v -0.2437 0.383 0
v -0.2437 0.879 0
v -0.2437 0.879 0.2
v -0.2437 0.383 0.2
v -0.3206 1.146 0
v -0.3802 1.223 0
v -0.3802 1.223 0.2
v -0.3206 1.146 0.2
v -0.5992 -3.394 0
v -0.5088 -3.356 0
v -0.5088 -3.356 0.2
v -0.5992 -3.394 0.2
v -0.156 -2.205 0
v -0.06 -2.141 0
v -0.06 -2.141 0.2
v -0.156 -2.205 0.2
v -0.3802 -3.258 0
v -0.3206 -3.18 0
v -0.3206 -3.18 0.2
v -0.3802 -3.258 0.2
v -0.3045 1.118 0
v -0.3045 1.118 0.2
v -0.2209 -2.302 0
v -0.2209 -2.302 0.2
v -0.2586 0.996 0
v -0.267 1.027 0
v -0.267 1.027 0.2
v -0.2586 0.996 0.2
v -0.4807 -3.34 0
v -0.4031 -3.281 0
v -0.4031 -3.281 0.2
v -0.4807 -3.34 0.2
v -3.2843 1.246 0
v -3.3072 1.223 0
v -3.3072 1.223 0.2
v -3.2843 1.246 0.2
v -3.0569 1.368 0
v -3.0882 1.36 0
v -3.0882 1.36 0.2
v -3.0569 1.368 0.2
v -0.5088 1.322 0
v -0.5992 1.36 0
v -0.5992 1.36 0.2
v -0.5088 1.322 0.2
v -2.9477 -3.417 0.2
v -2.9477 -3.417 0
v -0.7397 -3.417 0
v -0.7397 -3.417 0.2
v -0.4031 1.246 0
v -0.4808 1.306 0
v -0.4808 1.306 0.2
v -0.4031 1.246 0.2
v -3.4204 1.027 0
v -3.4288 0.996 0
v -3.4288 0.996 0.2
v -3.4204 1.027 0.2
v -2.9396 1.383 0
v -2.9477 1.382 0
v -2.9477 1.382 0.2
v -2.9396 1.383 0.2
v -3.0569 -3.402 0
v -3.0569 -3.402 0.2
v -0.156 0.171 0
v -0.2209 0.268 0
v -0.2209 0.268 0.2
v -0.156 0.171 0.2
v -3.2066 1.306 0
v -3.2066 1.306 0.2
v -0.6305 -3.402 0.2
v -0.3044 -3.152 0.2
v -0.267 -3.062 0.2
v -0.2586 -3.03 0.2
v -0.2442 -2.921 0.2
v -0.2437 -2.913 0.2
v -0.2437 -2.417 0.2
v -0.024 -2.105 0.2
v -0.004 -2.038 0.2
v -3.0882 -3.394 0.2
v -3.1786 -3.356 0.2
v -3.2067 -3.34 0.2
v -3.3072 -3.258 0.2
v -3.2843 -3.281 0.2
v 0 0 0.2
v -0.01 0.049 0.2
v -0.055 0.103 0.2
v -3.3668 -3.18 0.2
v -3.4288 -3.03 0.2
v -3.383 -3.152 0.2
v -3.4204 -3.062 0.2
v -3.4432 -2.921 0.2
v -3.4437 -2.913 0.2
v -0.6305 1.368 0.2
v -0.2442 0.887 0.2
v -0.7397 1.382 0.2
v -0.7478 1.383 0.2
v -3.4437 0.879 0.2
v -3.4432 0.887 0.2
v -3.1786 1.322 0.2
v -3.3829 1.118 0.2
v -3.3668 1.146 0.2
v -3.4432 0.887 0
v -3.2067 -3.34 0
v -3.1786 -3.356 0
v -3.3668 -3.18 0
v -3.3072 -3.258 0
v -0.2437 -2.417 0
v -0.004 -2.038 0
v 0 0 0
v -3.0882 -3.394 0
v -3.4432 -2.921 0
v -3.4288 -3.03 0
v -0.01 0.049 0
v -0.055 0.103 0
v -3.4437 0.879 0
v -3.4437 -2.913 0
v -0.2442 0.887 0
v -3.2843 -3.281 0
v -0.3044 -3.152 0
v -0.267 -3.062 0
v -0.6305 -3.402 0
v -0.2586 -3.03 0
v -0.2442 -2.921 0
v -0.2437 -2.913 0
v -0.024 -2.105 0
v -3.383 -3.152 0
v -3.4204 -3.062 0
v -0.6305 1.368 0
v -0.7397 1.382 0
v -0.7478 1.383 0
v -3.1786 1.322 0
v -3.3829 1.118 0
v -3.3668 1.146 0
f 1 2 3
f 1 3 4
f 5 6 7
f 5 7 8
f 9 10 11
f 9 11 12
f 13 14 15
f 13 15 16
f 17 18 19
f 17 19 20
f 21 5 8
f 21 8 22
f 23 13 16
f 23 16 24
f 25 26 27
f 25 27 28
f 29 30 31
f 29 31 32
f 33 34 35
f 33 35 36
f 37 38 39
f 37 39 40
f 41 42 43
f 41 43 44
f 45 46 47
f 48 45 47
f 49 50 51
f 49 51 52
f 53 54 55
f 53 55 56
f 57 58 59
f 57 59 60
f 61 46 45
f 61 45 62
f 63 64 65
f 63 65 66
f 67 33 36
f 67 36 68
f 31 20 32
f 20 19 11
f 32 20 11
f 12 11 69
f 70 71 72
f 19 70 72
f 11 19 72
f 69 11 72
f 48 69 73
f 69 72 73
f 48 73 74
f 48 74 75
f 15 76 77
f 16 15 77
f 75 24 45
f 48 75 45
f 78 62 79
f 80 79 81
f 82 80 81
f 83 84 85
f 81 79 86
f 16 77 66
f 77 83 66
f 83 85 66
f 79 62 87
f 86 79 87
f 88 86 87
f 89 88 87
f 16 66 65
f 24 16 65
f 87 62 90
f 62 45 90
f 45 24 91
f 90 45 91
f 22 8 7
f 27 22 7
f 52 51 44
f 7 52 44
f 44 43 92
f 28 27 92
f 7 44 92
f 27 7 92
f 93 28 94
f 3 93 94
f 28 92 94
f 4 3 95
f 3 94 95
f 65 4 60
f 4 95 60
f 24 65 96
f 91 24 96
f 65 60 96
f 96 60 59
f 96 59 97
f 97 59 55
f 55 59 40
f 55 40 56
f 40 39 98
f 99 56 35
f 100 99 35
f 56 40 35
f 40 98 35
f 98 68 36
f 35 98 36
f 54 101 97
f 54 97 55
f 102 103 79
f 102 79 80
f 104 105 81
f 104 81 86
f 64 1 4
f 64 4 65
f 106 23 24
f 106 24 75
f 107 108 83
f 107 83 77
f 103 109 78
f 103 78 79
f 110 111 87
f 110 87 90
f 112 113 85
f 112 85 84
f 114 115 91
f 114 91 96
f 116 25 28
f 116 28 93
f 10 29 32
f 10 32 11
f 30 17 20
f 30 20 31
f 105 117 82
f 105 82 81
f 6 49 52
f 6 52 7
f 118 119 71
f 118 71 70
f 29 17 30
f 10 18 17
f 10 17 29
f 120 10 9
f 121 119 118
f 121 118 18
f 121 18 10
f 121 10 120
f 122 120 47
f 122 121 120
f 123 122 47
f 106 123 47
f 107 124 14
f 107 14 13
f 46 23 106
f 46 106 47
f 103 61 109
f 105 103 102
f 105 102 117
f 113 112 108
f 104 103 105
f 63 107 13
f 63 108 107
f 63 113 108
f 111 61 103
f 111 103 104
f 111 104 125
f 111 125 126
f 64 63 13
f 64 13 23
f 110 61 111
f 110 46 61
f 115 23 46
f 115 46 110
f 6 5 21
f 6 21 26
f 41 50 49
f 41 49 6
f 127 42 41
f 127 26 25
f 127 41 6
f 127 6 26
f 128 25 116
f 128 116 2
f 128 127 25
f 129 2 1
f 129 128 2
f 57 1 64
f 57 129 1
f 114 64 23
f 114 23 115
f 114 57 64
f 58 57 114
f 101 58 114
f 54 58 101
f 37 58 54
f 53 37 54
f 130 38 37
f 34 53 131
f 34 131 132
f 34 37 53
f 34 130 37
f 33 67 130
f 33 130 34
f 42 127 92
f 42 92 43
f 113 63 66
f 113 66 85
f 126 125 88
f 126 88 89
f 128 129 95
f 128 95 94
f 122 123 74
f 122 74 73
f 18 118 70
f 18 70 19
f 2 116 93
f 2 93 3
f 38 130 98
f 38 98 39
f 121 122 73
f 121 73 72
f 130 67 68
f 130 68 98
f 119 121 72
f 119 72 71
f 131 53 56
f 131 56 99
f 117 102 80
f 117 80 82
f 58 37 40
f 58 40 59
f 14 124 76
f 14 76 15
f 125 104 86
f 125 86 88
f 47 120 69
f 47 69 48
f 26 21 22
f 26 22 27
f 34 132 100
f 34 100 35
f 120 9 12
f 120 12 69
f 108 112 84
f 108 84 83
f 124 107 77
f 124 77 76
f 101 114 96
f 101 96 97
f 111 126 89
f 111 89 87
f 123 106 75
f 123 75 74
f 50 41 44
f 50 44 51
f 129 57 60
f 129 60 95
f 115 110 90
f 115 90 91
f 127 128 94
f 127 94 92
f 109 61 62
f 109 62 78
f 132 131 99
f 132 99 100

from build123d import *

# Parameters (mm, degrees)
BOSS_EXTRUDE1_DEPTH   = 0.2
BOSS_EXTRUDE1_2_DEPTH = 0.2


with BuildPart() as part:
    # Model → Boss-Extrude1 (new body)
    with BuildSketch(Plane.XY):
        Polygon((-0.7397, 1.382), (-0.6305, 1.368), (-0.5992, 1.36), (-0.5088, 1.322), (-0.4808, 1.306), (-0.4031, 1.246), (-0.3802, 1.223), (-0.3206, 1.146), (-0.3045, 1.118), (-0.267, 1.027), (-0.2586, 0.996), (-0.2442, 0.887), (-0.2437, 0.879), (-0.2437, 0.383), (-0.2209, 0.268), (-0.156, 0.171), (-0.055, 0.103), (-0.01, 0.049), (0, 0), (-0.004, -2.038), (-0.024, -2.105), (-0.06, -2.141), (-0.156, -2.205), (-0.2209, -2.302), (-0.2437, -2.417), (-0.2437, -2.913), (-0.2442, -2.921), (-0.2586, -3.03), (-0.267, -3.062), (-0.3044, -3.152), (-0.3206, -3.18), (-0.3802, -3.258), (-0.4031, -3.281), (-0.4807, -3.34), (-0.5088, -3.356), (-0.5992, -3.394), (-0.6305, -3.402), (-0.7397, -3.417), (-0.7478, -3.417), (-2.9396, -3.417), (-2.9477, -3.417), (-3.0569, -3.402), (-3.0882, -3.394), (-3.1786, -3.356), (-3.2067, -3.34), (-3.2843, -3.281), (-3.3072, -3.258), (-3.3668, -3.18), (-3.383, -3.152), (-3.4204, -3.062), (-3.4288, -3.03), (-3.4432, -2.921), (-3.4437, -2.913), (-3.4437, 0.879), (-3.4432, 0.887), (-3.4288, 0.996), (-3.4204, 1.027), (-3.3829, 1.118), (-3.3668, 1.146), (-3.3072, 1.223), (-3.2843, 1.246), (-3.2066, 1.306), (-3.1786, 1.322), (-3.0882, 1.36), (-3.0569, 1.368), (-2.9477, 1.382), (-2.9396, 1.383), (-0.7478, 1.383), align=None)
    extrude(amount=BOSS_EXTRUDE1_DEPTH)


with BuildPart() as body_2:
    # Model → Boss-Extrude1 2 (new body)
    with BuildSketch(Plane.XY):
        Polygon((25.081, 4.408), (25.127, 4.355), (25.138, 4.304), (25.138, 3.44), (25.136, 3.416), (25.128, 3.375), (25.109, 3.331), (25.093, 3.307), (25.059, 3.273), (25.035, 3.257), (24.99, 3.238), (24.95, 3.23), (24.926, 3.228), (23.85, 3.228), (23.826, 3.23), (23.786, 3.238), (23.741, 3.257), (23.717, 3.273), (23.683, 3.307), (23.667, 3.331), (23.648, 3.375), (23.64, 3.416), (23.638, 3.44), (23.638, 4.304), (23.658, 4.371), (23.711, 4.416), (23.762, 4.428), (25.014, 4.428), align=None)
    extrude(amount=BOSS_EXTRUDE1_2_DEPTH)


solid = part.part
